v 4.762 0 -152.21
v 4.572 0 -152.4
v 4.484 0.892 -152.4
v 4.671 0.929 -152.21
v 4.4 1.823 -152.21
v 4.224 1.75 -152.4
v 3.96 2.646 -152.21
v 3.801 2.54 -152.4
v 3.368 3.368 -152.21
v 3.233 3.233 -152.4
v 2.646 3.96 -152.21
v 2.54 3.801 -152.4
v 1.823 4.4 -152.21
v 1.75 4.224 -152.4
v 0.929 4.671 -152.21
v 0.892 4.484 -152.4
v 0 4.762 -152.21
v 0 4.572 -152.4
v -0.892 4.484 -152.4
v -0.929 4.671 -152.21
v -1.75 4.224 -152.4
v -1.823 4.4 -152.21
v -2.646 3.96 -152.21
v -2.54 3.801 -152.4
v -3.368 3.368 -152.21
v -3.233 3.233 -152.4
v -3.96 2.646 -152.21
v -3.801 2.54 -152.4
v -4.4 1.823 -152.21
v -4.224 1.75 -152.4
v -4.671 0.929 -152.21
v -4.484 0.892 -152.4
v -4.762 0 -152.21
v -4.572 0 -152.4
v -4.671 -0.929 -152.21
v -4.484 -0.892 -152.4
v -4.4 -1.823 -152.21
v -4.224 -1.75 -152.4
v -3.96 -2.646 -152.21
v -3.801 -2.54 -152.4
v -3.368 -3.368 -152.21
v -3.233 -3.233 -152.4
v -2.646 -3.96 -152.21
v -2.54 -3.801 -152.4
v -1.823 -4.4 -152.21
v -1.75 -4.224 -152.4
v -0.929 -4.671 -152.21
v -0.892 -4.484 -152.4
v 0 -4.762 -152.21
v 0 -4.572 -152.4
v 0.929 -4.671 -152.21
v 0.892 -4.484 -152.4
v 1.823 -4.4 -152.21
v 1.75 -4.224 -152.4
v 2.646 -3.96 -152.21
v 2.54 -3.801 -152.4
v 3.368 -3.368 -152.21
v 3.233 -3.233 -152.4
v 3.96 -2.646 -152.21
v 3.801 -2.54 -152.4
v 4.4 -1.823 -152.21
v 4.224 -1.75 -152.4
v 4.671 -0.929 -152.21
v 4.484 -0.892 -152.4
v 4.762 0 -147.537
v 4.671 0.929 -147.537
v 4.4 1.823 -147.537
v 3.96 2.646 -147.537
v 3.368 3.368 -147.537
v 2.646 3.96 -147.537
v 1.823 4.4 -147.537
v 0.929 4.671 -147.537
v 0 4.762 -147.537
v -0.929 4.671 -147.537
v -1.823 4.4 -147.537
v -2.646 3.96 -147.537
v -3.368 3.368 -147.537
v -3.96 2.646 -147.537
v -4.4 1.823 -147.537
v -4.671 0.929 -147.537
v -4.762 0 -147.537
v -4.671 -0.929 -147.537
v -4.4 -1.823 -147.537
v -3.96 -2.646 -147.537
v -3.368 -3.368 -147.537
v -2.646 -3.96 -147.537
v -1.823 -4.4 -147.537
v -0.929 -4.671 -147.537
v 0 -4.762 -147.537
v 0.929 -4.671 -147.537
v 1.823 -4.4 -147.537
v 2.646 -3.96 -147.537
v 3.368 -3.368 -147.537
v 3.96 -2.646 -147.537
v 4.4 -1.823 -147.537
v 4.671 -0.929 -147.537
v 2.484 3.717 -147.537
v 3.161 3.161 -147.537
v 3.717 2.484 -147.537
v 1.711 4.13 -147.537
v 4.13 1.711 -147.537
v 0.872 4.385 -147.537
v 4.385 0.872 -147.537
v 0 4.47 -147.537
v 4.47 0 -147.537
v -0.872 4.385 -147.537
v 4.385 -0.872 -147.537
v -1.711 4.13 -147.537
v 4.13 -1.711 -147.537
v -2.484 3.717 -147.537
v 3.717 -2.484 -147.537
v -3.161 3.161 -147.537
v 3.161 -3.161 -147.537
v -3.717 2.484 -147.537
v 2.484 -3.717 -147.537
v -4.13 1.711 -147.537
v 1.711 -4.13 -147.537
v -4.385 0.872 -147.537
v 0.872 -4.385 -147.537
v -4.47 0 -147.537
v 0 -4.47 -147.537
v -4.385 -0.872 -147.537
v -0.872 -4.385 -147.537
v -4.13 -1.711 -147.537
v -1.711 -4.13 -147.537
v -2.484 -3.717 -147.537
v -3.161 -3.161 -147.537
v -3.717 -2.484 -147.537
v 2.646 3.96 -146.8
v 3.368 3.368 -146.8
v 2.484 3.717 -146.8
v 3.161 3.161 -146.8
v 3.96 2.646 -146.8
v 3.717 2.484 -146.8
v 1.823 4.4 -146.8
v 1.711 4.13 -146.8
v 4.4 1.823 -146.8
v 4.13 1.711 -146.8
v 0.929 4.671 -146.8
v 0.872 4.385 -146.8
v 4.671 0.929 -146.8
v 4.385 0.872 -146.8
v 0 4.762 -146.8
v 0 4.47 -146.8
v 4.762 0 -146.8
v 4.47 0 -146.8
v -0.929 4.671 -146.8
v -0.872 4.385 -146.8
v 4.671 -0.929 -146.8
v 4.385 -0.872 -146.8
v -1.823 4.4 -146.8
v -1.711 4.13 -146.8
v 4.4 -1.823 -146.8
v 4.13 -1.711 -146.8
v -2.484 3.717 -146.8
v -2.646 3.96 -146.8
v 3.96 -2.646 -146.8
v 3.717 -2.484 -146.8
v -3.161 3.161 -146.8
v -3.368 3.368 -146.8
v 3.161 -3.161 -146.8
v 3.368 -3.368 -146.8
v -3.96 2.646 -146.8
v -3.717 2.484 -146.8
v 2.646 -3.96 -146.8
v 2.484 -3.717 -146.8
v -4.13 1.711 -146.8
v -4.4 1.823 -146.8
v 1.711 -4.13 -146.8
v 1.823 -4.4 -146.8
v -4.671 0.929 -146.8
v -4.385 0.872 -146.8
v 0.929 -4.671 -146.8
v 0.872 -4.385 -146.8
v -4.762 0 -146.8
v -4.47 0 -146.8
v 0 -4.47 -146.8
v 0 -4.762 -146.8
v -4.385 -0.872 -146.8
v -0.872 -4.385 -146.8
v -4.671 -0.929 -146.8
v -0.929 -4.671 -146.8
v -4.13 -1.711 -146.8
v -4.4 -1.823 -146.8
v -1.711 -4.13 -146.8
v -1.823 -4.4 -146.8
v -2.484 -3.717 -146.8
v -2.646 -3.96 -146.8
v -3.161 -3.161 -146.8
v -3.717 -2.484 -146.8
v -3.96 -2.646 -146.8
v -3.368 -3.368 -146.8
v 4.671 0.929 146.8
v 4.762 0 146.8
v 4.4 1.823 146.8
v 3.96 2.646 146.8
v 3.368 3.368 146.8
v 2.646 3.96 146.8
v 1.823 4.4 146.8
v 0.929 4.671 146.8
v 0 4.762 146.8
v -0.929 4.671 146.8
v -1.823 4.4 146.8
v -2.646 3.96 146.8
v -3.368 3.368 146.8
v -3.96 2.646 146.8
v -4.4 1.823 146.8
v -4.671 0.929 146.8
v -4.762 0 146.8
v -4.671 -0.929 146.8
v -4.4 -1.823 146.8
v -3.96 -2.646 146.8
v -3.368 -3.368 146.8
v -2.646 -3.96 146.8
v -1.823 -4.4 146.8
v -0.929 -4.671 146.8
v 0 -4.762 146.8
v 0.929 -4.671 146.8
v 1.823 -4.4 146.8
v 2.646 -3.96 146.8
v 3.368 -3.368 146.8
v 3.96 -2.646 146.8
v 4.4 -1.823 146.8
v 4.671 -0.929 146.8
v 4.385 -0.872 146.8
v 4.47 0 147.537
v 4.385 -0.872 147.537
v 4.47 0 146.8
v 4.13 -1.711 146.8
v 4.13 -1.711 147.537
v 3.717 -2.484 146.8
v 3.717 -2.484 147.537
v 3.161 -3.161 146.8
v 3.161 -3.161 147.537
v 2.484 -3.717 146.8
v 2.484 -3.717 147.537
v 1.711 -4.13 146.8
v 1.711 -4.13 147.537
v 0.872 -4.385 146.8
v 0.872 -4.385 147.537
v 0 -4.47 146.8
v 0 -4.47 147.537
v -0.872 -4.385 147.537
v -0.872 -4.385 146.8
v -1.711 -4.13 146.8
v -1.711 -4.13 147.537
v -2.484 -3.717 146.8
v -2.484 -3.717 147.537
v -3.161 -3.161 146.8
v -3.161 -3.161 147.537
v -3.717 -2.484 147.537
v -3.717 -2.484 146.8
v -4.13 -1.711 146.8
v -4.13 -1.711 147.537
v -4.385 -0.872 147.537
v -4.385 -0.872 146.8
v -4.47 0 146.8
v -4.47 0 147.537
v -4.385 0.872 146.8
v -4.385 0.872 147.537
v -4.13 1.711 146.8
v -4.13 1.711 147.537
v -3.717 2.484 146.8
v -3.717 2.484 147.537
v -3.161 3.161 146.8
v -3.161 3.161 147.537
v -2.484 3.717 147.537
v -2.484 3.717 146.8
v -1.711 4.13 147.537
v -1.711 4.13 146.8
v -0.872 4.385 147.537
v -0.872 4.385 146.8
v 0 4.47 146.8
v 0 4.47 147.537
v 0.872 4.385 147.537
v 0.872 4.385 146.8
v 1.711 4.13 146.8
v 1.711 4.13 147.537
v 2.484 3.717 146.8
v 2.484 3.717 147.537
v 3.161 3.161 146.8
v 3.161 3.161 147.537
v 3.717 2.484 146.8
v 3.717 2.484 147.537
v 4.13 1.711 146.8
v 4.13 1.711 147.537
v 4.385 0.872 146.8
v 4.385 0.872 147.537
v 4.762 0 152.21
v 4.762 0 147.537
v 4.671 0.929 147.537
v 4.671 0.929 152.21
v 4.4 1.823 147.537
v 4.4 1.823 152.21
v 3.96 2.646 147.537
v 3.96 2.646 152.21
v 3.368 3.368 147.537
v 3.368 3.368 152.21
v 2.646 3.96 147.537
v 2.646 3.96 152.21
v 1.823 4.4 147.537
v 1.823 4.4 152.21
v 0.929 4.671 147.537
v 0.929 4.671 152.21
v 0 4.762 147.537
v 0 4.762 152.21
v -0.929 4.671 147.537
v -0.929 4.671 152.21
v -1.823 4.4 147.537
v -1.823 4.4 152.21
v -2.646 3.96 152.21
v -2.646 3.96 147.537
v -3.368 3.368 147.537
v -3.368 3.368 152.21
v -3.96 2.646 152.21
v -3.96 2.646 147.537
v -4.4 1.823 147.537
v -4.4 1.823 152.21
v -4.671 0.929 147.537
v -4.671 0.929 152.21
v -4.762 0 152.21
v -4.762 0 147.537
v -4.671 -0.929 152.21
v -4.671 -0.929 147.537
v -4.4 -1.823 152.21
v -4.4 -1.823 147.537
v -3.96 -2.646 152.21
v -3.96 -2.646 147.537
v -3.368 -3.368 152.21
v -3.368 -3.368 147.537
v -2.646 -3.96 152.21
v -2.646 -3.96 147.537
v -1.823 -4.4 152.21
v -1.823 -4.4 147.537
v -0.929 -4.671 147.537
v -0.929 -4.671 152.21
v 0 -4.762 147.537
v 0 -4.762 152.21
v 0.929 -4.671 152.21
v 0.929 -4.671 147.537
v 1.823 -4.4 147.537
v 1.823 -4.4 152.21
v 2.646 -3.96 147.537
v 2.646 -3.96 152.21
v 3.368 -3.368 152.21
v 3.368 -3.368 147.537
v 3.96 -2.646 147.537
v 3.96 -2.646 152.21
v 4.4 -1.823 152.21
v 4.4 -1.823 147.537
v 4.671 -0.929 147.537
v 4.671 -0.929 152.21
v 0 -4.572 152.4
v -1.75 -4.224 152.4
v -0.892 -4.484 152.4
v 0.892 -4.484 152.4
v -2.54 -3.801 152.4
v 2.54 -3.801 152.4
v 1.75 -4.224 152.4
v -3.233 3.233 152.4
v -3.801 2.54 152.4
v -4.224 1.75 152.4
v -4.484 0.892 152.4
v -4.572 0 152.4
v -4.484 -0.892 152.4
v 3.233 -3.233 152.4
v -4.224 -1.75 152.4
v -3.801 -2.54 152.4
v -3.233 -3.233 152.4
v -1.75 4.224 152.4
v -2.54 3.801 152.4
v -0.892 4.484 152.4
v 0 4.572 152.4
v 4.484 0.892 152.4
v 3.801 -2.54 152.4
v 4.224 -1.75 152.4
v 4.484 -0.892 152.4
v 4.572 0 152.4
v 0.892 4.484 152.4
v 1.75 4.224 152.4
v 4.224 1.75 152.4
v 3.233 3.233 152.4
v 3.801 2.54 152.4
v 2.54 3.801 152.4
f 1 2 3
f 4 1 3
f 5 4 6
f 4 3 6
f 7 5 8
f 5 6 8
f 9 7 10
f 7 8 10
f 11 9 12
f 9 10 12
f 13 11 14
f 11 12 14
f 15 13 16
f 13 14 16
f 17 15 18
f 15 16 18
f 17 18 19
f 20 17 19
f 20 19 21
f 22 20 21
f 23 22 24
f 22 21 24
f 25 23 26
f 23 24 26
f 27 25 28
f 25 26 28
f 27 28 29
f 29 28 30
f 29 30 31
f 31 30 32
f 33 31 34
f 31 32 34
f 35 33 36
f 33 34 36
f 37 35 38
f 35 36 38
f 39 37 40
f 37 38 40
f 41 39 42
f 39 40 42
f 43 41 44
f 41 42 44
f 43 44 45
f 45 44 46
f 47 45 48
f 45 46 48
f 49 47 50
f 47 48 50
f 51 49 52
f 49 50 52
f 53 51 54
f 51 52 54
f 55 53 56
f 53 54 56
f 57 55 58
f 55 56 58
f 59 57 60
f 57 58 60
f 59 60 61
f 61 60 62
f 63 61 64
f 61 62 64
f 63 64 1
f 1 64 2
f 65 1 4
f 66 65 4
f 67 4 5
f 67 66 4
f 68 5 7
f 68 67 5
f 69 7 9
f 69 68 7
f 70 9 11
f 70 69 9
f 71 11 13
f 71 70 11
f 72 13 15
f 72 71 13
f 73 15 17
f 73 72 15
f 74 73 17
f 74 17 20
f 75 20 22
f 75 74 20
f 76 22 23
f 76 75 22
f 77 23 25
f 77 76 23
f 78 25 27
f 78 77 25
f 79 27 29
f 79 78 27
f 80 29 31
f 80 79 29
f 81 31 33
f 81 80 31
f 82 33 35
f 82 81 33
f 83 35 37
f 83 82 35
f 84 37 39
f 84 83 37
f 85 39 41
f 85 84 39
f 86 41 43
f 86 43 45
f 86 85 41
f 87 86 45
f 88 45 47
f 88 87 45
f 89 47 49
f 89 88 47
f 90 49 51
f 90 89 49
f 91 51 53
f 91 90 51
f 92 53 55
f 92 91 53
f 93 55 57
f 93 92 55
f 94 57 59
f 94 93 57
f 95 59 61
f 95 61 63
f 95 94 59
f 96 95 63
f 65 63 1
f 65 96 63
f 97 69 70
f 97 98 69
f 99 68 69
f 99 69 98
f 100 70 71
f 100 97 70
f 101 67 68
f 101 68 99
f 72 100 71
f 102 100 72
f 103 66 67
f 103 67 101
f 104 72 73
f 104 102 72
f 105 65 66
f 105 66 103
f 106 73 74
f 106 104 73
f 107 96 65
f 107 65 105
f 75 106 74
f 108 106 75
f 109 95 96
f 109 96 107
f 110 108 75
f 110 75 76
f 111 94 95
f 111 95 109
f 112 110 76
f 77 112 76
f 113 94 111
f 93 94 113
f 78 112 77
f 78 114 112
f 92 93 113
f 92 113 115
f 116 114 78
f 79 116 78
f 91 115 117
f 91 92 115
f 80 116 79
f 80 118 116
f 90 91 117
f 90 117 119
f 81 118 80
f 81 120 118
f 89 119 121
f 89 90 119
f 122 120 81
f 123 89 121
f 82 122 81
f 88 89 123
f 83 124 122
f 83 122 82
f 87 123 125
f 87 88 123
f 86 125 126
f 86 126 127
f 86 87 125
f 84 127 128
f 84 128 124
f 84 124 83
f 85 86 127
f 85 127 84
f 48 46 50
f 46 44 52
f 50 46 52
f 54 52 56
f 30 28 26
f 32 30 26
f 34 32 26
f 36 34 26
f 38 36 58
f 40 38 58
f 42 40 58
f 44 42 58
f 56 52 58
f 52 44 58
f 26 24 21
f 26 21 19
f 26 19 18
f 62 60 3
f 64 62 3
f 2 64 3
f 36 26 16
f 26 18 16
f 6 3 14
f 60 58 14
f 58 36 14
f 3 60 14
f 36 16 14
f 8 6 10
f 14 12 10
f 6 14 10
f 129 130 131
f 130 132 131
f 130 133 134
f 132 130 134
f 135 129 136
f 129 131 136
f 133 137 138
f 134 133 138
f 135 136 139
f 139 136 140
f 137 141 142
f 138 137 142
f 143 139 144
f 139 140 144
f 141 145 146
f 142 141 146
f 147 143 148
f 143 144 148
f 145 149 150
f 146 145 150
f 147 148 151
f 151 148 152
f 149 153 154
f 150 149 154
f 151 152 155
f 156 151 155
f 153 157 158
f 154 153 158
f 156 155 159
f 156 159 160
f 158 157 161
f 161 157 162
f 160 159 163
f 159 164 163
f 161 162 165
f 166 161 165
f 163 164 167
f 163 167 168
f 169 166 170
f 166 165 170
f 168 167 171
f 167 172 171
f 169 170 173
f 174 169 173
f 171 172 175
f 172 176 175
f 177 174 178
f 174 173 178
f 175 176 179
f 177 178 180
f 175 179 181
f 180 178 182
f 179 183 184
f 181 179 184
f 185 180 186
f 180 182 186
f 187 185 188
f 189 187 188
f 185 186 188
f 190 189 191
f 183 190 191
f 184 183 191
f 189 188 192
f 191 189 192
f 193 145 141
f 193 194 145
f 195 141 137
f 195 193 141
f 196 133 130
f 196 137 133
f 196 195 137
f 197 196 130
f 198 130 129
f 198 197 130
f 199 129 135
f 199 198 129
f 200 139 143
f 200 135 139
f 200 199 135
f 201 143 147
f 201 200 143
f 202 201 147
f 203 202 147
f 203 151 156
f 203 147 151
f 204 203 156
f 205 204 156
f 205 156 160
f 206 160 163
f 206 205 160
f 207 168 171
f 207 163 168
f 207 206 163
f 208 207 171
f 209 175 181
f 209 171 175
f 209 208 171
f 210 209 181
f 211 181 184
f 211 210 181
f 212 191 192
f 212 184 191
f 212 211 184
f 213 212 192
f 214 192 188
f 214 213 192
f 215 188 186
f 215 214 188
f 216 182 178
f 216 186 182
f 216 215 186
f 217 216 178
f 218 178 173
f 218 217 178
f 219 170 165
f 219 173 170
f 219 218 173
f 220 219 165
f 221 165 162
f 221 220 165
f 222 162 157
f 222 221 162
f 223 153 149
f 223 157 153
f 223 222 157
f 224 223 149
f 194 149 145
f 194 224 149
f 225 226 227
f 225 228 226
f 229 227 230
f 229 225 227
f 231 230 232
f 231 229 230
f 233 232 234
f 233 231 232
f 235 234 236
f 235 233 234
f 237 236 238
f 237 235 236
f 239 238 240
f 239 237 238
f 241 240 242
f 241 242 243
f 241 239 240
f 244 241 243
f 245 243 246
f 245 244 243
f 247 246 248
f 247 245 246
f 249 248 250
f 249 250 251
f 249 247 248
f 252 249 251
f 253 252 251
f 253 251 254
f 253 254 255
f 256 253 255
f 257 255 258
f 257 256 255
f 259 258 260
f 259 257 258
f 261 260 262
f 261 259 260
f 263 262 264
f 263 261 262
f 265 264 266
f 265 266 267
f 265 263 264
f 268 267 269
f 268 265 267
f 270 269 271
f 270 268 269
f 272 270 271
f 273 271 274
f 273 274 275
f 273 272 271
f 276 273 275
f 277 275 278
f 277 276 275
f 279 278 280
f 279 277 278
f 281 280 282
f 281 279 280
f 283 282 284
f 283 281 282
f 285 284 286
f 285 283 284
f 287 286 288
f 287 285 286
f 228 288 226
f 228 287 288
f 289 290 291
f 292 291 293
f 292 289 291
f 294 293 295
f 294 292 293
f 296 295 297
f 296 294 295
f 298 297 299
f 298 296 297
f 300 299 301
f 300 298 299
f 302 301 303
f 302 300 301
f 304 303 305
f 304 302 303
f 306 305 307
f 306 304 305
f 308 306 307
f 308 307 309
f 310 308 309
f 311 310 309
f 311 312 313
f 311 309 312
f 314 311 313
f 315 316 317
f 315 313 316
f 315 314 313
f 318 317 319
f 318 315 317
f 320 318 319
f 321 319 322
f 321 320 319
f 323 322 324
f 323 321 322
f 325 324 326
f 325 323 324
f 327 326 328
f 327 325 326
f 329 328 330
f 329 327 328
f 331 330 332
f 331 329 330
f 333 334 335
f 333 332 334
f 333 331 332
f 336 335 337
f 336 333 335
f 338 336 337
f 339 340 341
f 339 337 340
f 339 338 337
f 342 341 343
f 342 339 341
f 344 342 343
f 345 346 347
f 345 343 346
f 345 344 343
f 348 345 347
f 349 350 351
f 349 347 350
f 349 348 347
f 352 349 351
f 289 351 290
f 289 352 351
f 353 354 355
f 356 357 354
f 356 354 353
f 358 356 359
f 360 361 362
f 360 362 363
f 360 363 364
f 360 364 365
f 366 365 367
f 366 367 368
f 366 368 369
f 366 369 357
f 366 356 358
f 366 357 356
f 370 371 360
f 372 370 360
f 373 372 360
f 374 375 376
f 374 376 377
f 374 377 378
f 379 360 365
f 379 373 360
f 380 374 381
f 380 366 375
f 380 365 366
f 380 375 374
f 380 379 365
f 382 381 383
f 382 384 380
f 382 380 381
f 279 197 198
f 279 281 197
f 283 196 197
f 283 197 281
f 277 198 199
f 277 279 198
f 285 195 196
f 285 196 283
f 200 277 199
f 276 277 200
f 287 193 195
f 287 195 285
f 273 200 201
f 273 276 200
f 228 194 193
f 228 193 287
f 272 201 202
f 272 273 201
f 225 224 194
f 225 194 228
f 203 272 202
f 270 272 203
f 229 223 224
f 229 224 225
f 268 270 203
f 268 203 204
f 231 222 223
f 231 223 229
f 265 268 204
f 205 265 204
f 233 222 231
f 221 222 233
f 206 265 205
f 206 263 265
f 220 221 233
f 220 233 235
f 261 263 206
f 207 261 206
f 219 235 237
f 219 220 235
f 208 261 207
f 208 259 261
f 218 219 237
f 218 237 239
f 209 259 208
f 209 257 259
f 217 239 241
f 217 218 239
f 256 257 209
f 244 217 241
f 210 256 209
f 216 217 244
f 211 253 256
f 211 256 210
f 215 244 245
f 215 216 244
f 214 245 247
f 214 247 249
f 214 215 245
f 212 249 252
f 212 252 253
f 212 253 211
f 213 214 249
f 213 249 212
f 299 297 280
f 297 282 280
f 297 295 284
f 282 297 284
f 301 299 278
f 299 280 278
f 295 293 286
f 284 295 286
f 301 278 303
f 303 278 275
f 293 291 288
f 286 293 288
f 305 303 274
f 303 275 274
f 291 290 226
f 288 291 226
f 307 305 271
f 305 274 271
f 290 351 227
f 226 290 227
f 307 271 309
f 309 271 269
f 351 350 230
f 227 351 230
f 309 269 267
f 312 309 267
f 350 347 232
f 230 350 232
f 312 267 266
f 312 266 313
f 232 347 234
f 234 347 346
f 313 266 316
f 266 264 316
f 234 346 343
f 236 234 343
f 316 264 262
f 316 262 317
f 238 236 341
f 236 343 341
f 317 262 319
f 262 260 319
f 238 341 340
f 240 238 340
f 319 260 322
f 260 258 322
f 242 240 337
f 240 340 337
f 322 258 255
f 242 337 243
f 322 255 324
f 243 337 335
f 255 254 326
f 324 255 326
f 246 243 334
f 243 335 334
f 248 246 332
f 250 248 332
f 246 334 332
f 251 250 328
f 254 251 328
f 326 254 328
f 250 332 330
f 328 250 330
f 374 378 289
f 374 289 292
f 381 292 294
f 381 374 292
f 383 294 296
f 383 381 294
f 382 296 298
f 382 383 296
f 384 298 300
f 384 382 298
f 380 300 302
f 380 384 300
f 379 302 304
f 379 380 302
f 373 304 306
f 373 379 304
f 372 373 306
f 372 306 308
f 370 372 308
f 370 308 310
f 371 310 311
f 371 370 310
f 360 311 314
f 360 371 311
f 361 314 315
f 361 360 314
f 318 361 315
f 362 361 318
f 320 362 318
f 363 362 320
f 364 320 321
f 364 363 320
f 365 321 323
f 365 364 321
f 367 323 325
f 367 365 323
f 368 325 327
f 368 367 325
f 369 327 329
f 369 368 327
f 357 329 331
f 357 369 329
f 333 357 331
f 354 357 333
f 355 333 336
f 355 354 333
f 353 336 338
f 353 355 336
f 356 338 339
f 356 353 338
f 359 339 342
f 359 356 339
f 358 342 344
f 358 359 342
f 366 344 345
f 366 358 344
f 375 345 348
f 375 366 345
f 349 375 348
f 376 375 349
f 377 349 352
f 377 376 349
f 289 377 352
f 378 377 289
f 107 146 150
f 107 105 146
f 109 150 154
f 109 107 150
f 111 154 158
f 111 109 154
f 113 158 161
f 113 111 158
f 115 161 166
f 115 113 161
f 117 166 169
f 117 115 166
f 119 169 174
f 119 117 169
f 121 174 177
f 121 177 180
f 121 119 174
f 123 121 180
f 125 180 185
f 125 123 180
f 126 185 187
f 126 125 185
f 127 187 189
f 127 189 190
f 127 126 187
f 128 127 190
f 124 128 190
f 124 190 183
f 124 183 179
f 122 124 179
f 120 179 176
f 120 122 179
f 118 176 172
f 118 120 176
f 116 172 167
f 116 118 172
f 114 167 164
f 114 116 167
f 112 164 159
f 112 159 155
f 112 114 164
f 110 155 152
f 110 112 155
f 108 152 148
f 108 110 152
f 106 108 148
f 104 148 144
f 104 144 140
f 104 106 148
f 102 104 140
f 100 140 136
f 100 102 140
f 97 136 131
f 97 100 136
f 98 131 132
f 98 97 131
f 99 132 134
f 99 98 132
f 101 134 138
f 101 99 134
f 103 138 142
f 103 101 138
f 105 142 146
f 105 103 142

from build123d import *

# Parameters (mm, degrees)
SKETCH3_R                = 4.7625
BOSS_EXTRUDE1_DEPTH      = 152.4
BOSS_EXTRUDE1_DEPTH_BACK = 152.4
CHAMFER1_SIZE            = 0.1905
SKETCH4_W                = 0.2921
SKETCH4_H                = 0.7366


with BuildPart() as part:
    # Sketch3 → Boss-Extrude1 (new body, two sides)
    with BuildSketch(Plane.XY) as boss_extrude1_sk:
        Circle(SKETCH3_R)
    extrude(amount=BOSS_EXTRUDE1_DEPTH)
    extrude(boss_extrude1_sk.sketch, amount=-BOSS_EXTRUDE1_DEPTH_BACK)

    # Chamfer1
    chamfer1_edges = [part.edges().sort_by_distance(p)[0] for p in [
        (-4.7625, 0, -152.4),
        (-4.7625, 0, 152.4),
    ]]
    chamfer(chamfer1_edges, length=CHAMFER1_SIZE)

    # Sketch4 → Cut-Revolve1 (revolve, cut)
    with BuildSketch(Plane(origin=(0, 0, 0), x_dir=(1, 0, 0), z_dir=(0, 1, 0))):
        with Locations((4.61645, 147.1683)):
            Rectangle(SKETCH4_W, SKETCH4_H)
        with Locations((4.61645, -147.1683)):
            Rectangle(SKETCH4_W, SKETCH4_H)
    revolve(axis=Axis((0, 0, 1000), (0, 0, -1)), mode=Mode.SUBTRACT)


solid = part.part
